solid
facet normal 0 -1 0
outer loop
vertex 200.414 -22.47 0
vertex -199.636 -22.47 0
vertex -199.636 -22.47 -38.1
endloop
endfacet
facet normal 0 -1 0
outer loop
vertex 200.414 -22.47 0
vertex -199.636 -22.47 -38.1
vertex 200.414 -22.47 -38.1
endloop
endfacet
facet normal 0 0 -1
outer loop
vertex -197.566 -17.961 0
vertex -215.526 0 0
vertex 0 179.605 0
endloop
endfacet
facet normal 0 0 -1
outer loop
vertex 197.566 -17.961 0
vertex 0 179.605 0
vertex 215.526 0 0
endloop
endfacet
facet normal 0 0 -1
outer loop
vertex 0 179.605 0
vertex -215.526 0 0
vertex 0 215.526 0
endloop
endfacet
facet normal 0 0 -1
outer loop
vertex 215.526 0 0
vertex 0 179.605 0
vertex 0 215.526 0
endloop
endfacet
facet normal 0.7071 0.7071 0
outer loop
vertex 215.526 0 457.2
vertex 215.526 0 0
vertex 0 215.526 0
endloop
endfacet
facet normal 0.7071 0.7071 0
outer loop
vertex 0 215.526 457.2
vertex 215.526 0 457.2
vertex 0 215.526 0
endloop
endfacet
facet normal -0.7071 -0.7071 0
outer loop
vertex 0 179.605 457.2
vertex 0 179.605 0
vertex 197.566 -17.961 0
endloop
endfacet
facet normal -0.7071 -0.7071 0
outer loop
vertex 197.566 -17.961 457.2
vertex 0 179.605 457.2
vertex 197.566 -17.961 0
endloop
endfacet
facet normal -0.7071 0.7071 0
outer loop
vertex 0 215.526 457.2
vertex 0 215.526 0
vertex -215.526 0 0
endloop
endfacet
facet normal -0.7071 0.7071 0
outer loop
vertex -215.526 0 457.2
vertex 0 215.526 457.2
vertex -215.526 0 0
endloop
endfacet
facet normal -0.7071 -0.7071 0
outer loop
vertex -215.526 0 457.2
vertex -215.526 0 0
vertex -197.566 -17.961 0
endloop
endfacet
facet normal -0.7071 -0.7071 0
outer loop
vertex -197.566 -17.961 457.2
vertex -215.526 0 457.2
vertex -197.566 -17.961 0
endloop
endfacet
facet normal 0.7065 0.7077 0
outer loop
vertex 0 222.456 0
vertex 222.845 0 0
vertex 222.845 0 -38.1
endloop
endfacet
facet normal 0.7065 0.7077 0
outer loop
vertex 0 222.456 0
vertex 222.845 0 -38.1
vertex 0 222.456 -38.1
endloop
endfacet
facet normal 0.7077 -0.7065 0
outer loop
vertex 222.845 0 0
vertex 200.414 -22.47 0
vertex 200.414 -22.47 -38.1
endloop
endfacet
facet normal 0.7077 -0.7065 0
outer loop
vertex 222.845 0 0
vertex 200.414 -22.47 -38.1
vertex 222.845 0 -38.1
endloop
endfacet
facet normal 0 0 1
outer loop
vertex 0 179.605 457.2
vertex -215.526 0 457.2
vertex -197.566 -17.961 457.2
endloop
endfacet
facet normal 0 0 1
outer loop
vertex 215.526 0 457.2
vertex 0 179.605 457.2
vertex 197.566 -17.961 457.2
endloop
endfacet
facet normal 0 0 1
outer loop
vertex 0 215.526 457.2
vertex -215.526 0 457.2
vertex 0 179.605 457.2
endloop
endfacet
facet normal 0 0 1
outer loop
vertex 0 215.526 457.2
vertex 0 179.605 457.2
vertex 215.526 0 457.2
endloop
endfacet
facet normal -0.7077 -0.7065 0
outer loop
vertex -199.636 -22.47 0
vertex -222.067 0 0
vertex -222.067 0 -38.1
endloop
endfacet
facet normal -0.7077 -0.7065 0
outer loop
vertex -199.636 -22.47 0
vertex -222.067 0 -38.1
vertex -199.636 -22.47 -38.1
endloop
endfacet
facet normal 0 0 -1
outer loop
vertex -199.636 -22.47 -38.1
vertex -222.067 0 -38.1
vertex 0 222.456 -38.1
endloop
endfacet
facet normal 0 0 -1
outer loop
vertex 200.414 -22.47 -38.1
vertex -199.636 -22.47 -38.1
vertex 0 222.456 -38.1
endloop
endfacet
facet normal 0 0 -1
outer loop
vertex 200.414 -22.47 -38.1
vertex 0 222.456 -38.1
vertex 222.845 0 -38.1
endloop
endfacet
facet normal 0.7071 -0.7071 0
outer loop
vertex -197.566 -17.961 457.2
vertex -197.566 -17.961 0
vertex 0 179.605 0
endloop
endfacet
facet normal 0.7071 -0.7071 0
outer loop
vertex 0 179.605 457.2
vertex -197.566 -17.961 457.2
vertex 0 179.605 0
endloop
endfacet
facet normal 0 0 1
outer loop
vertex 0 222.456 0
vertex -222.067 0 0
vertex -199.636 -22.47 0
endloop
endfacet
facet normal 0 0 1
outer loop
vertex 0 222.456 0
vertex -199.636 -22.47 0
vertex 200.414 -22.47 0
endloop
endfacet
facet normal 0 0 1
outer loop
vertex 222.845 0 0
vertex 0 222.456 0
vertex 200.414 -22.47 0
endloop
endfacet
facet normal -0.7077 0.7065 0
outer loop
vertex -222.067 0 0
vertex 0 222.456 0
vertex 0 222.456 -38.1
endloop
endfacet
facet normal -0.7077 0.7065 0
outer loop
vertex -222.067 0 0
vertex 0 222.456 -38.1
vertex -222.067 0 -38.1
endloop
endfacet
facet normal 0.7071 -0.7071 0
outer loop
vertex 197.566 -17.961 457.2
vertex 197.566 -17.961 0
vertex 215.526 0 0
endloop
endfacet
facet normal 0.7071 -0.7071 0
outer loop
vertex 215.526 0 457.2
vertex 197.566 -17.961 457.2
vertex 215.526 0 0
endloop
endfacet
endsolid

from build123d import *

# Parameters (mm, degrees)
F1_DEPTH = 457.2
F3_DEPTH = 38.1


with BuildPart() as f1:
    # F0 (on Top) → F1 (new body)
    with BuildSketch(Plane.XY):
        Polygon((215.526147, 0), (0, 215.526147), (-215.526147, 0), (-197.565635, -17.960512), (0, 179.605122), (197.565635, -17.960512), align=None)
    extrude(amount=F1_DEPTH)


with BuildPart() as f3:
    # F2 (on Top) → F3 (new body)
    with BuildSketch(Plane.XY):
        Polygon((0, 222.455655), (-222.066853, 0), (-199.635858, -22.470268), (200.414142, -22.470268), (222.845137, 0), align=None)
    extrude(amount=-F3_DEPTH)


solid = Compound([f1.part, f3.part])
